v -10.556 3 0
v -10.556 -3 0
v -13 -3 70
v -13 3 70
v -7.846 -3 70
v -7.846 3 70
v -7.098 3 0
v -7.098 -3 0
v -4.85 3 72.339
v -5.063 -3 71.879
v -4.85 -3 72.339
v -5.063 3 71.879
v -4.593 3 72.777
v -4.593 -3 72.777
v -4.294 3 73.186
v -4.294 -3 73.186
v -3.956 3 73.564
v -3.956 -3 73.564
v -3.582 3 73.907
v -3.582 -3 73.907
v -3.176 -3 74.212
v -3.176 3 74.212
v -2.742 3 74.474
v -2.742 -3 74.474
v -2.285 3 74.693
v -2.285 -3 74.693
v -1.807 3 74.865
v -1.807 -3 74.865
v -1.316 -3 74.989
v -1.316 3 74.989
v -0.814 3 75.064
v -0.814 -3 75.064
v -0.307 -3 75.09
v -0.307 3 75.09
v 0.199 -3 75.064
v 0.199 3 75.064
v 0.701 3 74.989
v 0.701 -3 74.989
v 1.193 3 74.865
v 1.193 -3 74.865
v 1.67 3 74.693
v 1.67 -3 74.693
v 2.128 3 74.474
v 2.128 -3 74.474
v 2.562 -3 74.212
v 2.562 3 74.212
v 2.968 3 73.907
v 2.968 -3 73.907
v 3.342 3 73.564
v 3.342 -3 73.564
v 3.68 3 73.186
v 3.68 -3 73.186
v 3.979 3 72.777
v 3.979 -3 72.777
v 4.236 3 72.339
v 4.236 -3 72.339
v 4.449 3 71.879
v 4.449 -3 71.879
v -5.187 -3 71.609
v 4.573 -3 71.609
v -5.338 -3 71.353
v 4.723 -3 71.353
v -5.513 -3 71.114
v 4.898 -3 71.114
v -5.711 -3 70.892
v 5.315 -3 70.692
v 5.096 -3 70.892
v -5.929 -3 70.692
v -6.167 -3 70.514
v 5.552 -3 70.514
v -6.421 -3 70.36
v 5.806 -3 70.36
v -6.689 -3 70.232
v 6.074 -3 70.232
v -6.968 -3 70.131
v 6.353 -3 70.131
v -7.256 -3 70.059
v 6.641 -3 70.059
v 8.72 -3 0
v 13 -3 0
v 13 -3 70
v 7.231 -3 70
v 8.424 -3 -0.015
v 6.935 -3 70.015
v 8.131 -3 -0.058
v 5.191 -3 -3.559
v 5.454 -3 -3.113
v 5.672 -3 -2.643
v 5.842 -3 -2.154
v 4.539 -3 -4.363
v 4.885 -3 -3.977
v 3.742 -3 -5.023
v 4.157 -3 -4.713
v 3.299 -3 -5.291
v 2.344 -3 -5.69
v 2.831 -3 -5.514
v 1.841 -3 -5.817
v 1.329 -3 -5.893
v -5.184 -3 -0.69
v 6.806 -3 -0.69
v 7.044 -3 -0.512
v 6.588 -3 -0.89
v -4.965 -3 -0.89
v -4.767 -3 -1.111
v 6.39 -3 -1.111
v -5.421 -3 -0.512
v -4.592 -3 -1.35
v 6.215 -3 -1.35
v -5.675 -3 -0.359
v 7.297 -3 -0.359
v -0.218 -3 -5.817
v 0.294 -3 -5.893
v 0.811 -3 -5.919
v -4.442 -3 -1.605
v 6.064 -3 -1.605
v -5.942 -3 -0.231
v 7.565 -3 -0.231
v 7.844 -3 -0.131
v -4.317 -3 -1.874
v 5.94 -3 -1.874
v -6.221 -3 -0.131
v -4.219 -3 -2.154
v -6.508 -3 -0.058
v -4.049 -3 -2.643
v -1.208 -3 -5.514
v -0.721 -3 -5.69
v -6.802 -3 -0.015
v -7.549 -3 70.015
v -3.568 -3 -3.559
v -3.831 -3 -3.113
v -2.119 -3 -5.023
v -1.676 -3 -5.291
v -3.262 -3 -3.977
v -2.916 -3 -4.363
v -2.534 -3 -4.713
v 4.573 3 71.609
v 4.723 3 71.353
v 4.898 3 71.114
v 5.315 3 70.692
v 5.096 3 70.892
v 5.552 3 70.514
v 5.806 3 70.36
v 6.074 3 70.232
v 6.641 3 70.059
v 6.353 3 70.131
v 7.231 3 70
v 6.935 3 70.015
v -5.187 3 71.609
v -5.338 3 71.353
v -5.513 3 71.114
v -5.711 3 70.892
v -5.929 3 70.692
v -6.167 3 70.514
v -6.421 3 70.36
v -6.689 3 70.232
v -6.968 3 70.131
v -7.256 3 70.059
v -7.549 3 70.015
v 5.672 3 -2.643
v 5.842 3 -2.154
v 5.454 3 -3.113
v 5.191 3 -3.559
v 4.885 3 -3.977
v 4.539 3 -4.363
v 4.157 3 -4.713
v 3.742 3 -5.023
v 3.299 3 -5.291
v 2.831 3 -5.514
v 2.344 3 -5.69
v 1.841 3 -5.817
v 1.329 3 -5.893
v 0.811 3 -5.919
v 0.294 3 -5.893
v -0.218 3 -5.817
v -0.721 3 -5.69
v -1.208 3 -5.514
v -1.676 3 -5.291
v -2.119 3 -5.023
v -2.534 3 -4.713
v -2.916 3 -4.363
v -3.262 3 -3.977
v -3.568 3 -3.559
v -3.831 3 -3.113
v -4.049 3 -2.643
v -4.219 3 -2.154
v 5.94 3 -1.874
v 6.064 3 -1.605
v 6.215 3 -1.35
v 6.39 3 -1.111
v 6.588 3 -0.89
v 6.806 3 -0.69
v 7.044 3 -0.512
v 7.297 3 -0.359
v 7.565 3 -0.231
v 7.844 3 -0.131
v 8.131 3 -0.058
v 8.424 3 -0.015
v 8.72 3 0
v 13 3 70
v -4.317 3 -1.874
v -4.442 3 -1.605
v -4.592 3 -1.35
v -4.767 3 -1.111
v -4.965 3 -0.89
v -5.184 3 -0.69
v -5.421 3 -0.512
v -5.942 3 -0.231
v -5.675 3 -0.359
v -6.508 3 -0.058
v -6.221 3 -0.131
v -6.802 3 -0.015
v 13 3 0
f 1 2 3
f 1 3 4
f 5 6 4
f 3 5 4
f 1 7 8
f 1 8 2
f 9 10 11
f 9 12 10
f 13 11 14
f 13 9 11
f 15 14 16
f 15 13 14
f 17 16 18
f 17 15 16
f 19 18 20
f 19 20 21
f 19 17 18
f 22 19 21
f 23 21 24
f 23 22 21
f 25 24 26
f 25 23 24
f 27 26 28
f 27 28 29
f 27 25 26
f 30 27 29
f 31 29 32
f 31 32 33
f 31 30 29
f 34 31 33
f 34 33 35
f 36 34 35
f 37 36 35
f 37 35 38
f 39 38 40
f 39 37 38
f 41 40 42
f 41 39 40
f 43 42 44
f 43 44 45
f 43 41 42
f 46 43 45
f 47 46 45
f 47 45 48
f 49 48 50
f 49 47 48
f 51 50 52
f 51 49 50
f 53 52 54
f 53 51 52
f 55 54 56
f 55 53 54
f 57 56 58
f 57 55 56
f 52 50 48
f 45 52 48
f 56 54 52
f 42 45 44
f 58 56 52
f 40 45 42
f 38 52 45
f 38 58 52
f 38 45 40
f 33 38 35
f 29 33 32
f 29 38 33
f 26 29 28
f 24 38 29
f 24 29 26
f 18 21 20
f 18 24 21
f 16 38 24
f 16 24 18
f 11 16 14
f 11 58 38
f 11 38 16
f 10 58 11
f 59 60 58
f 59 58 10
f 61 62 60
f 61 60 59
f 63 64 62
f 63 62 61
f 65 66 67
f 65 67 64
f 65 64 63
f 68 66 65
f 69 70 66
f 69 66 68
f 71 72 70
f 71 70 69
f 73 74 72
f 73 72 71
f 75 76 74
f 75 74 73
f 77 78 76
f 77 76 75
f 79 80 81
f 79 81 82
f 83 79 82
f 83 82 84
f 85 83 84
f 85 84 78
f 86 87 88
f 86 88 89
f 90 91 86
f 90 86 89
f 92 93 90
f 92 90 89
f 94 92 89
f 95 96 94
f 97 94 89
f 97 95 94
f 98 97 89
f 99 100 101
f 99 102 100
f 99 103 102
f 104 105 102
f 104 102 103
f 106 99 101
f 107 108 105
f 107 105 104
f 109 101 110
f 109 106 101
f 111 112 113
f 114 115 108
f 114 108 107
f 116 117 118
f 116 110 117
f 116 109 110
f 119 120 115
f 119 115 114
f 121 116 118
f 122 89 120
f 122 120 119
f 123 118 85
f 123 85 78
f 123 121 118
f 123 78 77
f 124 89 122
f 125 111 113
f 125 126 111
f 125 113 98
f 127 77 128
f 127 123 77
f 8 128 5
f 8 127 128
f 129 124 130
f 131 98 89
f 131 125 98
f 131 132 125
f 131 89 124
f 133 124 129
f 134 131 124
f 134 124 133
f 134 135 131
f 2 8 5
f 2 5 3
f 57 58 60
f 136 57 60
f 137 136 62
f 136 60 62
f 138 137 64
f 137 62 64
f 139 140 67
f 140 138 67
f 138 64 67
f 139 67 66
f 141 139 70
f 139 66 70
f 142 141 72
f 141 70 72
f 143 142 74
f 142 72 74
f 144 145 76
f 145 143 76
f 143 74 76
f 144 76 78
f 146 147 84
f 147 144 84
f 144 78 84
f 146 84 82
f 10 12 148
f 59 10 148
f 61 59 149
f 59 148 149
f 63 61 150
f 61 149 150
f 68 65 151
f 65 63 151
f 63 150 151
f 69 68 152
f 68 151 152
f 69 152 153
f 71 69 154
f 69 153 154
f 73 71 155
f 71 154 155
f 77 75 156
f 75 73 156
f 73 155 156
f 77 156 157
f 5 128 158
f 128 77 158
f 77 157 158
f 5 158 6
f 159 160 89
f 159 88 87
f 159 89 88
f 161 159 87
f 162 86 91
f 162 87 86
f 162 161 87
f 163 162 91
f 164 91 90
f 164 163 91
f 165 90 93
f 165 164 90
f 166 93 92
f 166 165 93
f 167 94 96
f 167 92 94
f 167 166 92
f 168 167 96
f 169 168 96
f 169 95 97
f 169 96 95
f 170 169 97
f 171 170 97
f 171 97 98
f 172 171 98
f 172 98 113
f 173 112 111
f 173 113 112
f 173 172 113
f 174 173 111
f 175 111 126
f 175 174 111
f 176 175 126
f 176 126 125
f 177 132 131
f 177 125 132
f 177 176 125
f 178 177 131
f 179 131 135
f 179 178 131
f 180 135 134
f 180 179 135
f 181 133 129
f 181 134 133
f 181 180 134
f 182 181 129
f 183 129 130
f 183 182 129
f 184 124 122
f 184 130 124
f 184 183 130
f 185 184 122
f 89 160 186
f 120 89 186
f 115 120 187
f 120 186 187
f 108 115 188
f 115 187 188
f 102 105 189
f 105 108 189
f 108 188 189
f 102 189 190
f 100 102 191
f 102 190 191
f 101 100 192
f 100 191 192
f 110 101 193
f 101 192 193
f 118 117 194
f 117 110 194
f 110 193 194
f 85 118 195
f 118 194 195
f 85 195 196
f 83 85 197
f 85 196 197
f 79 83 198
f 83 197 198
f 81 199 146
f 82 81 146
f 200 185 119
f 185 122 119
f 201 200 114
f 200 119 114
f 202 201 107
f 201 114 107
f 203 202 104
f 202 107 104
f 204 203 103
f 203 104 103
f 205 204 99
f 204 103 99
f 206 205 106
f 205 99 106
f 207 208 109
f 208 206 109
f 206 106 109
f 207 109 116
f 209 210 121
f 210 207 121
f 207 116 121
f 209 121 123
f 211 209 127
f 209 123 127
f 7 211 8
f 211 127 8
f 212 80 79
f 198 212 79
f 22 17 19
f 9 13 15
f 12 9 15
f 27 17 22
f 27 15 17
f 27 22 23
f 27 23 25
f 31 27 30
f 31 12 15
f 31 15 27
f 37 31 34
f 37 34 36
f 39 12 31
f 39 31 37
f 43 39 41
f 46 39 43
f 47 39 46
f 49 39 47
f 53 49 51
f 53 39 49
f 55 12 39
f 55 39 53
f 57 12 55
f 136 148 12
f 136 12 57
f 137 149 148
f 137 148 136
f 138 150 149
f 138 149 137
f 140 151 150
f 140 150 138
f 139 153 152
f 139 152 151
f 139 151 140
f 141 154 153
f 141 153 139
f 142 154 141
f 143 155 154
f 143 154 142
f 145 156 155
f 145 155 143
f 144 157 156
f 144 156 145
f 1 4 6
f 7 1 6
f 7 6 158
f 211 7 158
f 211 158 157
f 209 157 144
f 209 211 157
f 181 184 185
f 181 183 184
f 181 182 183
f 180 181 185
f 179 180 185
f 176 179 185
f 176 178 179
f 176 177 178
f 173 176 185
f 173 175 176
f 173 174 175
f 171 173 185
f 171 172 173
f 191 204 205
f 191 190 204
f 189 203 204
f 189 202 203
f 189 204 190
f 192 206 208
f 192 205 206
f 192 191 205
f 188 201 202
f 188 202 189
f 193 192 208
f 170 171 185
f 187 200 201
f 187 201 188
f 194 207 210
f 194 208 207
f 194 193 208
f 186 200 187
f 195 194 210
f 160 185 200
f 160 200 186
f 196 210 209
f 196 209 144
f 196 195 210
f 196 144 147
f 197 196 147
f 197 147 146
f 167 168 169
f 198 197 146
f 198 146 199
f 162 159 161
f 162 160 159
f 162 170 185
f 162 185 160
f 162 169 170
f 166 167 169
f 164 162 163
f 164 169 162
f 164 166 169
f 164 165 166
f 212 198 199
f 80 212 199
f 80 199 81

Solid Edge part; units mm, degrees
sketch "Sketch1" plane through (0, 0, 0) normal (0, 0, 1) x (1, 0, 0)
  line L0 (-13, 3) -> (13, 3)
  line L1 (13, 3) -> (13, -3)
  line L2 (13, -3) -> (-13, -3)
  line L3 (-13, -3) -> (-13, 3)
  dimension "D1" = 26
  dimension "D2" = 6
extrude "Protrusion1" add sketch "Sketch1" along normal blind 70
draft "Draft_2" angle 2 neutral plane through (0, 0, 70) normal (0, 0, 1) pull direction (0, 0, -1) face at (-13, -2.06, 57.6333)
sketch "Sketch2" plane through (0, 0, 0) normal (0, -1, 0) x (1, 0, 0)
  line L0 (-5.4345, 70) -> (4.8202, 70)
  arc A0 (-5.4345, 70) -> (4.8202, 70) centre (-0.3072, 69.9621) cw
  line L1 (-4.3885, 0) -> (6.0113, 0)
  arc A1 (-4.3885, 0) -> (6.0113, 0) centre (0.8114, -0.6752) ccw
extrude "ExtrudedProtrusion_2" add sketch "Sketch2" along normal mid plane 6
fillet "Round_1" radius 3 4 edges at (4.8202, 0, 70) (-5.4345, 0, 70) (6.0113, 0, 0) (-4.3885, 0, 0)
properties part number "3"
